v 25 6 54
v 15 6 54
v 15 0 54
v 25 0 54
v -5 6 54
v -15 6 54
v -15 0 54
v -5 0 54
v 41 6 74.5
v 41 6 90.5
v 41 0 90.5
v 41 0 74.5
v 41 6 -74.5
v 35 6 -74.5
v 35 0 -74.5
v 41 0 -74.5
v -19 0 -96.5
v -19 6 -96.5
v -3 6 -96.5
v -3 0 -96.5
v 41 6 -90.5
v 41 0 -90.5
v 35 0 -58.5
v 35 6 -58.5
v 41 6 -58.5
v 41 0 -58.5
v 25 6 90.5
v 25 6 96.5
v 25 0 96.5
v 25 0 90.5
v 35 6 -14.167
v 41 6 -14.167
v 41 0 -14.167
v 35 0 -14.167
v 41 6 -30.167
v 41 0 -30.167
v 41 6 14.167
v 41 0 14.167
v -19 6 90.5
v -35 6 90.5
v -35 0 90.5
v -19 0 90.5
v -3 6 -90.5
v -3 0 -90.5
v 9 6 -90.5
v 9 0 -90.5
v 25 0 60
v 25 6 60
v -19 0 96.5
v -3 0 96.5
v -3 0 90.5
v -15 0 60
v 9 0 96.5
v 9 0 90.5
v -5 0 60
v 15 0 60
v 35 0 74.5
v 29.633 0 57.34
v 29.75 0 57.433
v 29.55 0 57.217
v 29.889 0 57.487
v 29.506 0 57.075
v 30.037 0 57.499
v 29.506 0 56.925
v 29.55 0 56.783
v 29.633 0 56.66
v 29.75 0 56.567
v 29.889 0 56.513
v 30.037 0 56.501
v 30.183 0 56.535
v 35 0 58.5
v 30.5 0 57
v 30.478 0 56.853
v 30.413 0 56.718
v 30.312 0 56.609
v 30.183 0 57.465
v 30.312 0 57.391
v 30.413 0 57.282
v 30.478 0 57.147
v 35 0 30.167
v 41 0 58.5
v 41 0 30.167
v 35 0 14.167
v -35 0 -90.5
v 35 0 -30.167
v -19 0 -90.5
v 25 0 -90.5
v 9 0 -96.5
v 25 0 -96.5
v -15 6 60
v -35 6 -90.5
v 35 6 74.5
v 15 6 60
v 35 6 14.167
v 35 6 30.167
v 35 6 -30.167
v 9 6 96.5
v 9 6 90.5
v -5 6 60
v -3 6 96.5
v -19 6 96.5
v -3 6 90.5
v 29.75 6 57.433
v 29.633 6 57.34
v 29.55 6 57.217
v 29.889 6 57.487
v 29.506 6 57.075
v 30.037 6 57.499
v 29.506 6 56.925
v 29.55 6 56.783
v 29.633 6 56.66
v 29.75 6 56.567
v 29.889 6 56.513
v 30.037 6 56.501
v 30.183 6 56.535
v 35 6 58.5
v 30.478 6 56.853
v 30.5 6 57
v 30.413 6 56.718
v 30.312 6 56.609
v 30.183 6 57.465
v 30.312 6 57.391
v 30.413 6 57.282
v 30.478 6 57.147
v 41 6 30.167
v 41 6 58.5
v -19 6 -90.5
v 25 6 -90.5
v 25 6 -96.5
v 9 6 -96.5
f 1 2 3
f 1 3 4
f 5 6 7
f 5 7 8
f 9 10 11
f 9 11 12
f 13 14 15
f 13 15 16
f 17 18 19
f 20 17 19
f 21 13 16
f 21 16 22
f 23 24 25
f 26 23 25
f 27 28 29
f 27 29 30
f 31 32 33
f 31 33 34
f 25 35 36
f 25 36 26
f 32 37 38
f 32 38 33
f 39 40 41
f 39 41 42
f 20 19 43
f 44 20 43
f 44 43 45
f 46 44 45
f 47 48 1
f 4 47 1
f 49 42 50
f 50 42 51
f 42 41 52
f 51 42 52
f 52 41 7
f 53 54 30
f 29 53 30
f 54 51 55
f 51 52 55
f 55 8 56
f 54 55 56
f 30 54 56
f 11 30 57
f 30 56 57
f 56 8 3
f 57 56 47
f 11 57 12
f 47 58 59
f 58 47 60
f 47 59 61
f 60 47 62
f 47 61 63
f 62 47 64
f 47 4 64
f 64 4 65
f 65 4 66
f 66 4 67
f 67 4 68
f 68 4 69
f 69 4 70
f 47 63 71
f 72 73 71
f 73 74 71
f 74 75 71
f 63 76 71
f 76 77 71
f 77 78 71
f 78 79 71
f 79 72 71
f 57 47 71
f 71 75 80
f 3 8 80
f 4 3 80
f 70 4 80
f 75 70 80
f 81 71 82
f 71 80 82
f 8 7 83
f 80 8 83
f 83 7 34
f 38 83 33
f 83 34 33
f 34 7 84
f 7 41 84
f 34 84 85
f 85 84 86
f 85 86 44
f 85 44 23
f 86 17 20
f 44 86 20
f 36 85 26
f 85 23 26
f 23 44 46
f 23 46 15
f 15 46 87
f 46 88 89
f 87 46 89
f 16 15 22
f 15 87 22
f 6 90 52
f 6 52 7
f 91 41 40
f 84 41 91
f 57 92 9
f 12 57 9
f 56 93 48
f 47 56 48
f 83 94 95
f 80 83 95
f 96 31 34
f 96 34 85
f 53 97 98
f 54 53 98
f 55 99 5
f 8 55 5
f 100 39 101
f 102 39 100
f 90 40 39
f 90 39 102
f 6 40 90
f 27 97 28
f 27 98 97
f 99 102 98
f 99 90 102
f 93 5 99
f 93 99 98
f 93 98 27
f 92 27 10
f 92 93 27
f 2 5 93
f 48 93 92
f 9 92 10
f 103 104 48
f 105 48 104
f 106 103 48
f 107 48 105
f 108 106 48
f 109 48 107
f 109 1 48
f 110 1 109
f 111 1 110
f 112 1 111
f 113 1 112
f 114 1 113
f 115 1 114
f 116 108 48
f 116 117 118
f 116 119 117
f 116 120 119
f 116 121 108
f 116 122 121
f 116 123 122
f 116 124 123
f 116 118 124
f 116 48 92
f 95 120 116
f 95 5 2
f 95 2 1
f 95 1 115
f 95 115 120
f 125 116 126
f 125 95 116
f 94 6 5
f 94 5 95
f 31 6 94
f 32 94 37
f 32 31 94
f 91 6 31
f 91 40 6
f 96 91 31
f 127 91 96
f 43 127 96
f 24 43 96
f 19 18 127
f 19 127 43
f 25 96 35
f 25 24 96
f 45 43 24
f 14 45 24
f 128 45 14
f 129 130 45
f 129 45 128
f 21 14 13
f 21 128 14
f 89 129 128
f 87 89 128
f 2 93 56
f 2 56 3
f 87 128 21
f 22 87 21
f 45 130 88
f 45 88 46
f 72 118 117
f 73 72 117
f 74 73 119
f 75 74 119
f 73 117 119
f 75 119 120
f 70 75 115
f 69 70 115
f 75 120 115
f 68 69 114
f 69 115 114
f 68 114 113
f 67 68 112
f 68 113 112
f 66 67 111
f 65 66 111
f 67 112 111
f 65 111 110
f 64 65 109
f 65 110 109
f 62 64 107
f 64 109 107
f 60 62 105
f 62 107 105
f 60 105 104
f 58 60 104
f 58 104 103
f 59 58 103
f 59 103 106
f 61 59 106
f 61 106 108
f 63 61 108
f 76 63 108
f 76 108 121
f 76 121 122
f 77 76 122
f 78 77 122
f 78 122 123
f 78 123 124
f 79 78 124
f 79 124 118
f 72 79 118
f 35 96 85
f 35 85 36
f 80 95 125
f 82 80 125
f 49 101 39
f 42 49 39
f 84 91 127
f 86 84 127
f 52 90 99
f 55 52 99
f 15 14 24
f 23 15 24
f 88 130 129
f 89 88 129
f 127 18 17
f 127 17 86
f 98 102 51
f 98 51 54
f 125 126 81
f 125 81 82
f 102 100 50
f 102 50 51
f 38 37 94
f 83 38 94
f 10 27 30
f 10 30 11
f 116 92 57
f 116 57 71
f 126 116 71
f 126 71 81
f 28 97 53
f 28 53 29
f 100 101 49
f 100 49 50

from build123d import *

# Parameters (mm, degrees)
SKETCH1_W           = 60
SKETCH1_H           = 193
SKETCH1_W_2         = 10
BOSS_EXTRUDE1_DEPTH = 6
SKETCH4_W           = 6
SKETCH4_H           = 193
BOSS_EXTRUDE2_DEPTH = 6
SKETCH5_W           = 6
SKETCH5_H           = 16
SKETCH5_W_2         = 16
SKETCH5_H_2         = 6
SKETCH5_W_3         = 12
CUT_EXTRUDE1_DEPTH  = 7
SKETCH6_R           = 0.5
SKETCH6_W           = 10
SKETCH6_H           = 6
CUT_EXTRUDE2_DEPTH  = 7


with BuildPart() as part:
    # Sketch1 → Boss-Extrude1 (new body)
    with BuildSketch(Plane(origin=(0, 0, 0), x_dir=(1, 0, 0), z_dir=(0, 1, 0))):
        with Locations((5, 0)):
            Rectangle(SKETCH1_W, SKETCH1_H)
        with Locations((-30, 0)):
            Rectangle(SKETCH1_W_2, SKETCH1_H)
    extrude(amount=BOSS_EXTRUDE1_DEPTH)

    # Sketch4 → Boss-Extrude2 (add)
    with BuildSketch(Plane(origin=(0, 6, 0), x_dir=(1, 0, 0), z_dir=(0, 1, 0))):
        with Locations((38, 0)):
            Rectangle(SKETCH4_W, SKETCH4_H)
    extrude(amount=-BOSS_EXTRUDE2_DEPTH)

    # Sketch5 → Cut-Extrude1 (cut, through all)
    with BuildSketch(Plane(origin=(0, 6, 0), x_dir=(1, 0, 0), z_dir=(0, 1, 0))):
        with Locations((38, -66.5)):
            Rectangle(SKETCH5_W, SKETCH5_H)
        Polygon((35, -30.166666667), (41, -30.166666667), (41, -14.166666667), (38, -14.166666667), (35, -14.166666667), align=None)
        with Locations((33, -93.5)):
            Rectangle(SKETCH5_W_2, SKETCH5_H_2)
        with Locations((-27, -93.5)):
            Rectangle(SKETCH5_W_2, SKETCH5_H_2)
        with Locations((3, -93.5)):
            Rectangle(SKETCH5_W_3, SKETCH5_H_2)
    cut_extrude1 = extrude(amount=-CUT_EXTRUDE1_DEPTH, mode=Mode.SUBTRACT)

    # Mirror1: Cut-Extrude1 across plane
    add(cut_extrude1.mirror(Plane.XY), mode=Mode.SUBTRACT)

    # Sketch6 → Cut-Extrude2 (cut, through all)
    with BuildSketch(Plane(origin=(0, 6, 0), x_dir=(1, 0, 0), z_dir=(0, 1, 0))):
        with Locations((30, -57)):
            Circle(SKETCH6_R)
        with Locations((20, -57)):
            Rectangle(SKETCH6_W, SKETCH6_H)
        with Locations((-10, -57)):
            Rectangle(SKETCH6_W, SKETCH6_H)
    extrude(amount=-CUT_EXTRUDE2_DEPTH, mode=Mode.SUBTRACT)


solid = part.part
